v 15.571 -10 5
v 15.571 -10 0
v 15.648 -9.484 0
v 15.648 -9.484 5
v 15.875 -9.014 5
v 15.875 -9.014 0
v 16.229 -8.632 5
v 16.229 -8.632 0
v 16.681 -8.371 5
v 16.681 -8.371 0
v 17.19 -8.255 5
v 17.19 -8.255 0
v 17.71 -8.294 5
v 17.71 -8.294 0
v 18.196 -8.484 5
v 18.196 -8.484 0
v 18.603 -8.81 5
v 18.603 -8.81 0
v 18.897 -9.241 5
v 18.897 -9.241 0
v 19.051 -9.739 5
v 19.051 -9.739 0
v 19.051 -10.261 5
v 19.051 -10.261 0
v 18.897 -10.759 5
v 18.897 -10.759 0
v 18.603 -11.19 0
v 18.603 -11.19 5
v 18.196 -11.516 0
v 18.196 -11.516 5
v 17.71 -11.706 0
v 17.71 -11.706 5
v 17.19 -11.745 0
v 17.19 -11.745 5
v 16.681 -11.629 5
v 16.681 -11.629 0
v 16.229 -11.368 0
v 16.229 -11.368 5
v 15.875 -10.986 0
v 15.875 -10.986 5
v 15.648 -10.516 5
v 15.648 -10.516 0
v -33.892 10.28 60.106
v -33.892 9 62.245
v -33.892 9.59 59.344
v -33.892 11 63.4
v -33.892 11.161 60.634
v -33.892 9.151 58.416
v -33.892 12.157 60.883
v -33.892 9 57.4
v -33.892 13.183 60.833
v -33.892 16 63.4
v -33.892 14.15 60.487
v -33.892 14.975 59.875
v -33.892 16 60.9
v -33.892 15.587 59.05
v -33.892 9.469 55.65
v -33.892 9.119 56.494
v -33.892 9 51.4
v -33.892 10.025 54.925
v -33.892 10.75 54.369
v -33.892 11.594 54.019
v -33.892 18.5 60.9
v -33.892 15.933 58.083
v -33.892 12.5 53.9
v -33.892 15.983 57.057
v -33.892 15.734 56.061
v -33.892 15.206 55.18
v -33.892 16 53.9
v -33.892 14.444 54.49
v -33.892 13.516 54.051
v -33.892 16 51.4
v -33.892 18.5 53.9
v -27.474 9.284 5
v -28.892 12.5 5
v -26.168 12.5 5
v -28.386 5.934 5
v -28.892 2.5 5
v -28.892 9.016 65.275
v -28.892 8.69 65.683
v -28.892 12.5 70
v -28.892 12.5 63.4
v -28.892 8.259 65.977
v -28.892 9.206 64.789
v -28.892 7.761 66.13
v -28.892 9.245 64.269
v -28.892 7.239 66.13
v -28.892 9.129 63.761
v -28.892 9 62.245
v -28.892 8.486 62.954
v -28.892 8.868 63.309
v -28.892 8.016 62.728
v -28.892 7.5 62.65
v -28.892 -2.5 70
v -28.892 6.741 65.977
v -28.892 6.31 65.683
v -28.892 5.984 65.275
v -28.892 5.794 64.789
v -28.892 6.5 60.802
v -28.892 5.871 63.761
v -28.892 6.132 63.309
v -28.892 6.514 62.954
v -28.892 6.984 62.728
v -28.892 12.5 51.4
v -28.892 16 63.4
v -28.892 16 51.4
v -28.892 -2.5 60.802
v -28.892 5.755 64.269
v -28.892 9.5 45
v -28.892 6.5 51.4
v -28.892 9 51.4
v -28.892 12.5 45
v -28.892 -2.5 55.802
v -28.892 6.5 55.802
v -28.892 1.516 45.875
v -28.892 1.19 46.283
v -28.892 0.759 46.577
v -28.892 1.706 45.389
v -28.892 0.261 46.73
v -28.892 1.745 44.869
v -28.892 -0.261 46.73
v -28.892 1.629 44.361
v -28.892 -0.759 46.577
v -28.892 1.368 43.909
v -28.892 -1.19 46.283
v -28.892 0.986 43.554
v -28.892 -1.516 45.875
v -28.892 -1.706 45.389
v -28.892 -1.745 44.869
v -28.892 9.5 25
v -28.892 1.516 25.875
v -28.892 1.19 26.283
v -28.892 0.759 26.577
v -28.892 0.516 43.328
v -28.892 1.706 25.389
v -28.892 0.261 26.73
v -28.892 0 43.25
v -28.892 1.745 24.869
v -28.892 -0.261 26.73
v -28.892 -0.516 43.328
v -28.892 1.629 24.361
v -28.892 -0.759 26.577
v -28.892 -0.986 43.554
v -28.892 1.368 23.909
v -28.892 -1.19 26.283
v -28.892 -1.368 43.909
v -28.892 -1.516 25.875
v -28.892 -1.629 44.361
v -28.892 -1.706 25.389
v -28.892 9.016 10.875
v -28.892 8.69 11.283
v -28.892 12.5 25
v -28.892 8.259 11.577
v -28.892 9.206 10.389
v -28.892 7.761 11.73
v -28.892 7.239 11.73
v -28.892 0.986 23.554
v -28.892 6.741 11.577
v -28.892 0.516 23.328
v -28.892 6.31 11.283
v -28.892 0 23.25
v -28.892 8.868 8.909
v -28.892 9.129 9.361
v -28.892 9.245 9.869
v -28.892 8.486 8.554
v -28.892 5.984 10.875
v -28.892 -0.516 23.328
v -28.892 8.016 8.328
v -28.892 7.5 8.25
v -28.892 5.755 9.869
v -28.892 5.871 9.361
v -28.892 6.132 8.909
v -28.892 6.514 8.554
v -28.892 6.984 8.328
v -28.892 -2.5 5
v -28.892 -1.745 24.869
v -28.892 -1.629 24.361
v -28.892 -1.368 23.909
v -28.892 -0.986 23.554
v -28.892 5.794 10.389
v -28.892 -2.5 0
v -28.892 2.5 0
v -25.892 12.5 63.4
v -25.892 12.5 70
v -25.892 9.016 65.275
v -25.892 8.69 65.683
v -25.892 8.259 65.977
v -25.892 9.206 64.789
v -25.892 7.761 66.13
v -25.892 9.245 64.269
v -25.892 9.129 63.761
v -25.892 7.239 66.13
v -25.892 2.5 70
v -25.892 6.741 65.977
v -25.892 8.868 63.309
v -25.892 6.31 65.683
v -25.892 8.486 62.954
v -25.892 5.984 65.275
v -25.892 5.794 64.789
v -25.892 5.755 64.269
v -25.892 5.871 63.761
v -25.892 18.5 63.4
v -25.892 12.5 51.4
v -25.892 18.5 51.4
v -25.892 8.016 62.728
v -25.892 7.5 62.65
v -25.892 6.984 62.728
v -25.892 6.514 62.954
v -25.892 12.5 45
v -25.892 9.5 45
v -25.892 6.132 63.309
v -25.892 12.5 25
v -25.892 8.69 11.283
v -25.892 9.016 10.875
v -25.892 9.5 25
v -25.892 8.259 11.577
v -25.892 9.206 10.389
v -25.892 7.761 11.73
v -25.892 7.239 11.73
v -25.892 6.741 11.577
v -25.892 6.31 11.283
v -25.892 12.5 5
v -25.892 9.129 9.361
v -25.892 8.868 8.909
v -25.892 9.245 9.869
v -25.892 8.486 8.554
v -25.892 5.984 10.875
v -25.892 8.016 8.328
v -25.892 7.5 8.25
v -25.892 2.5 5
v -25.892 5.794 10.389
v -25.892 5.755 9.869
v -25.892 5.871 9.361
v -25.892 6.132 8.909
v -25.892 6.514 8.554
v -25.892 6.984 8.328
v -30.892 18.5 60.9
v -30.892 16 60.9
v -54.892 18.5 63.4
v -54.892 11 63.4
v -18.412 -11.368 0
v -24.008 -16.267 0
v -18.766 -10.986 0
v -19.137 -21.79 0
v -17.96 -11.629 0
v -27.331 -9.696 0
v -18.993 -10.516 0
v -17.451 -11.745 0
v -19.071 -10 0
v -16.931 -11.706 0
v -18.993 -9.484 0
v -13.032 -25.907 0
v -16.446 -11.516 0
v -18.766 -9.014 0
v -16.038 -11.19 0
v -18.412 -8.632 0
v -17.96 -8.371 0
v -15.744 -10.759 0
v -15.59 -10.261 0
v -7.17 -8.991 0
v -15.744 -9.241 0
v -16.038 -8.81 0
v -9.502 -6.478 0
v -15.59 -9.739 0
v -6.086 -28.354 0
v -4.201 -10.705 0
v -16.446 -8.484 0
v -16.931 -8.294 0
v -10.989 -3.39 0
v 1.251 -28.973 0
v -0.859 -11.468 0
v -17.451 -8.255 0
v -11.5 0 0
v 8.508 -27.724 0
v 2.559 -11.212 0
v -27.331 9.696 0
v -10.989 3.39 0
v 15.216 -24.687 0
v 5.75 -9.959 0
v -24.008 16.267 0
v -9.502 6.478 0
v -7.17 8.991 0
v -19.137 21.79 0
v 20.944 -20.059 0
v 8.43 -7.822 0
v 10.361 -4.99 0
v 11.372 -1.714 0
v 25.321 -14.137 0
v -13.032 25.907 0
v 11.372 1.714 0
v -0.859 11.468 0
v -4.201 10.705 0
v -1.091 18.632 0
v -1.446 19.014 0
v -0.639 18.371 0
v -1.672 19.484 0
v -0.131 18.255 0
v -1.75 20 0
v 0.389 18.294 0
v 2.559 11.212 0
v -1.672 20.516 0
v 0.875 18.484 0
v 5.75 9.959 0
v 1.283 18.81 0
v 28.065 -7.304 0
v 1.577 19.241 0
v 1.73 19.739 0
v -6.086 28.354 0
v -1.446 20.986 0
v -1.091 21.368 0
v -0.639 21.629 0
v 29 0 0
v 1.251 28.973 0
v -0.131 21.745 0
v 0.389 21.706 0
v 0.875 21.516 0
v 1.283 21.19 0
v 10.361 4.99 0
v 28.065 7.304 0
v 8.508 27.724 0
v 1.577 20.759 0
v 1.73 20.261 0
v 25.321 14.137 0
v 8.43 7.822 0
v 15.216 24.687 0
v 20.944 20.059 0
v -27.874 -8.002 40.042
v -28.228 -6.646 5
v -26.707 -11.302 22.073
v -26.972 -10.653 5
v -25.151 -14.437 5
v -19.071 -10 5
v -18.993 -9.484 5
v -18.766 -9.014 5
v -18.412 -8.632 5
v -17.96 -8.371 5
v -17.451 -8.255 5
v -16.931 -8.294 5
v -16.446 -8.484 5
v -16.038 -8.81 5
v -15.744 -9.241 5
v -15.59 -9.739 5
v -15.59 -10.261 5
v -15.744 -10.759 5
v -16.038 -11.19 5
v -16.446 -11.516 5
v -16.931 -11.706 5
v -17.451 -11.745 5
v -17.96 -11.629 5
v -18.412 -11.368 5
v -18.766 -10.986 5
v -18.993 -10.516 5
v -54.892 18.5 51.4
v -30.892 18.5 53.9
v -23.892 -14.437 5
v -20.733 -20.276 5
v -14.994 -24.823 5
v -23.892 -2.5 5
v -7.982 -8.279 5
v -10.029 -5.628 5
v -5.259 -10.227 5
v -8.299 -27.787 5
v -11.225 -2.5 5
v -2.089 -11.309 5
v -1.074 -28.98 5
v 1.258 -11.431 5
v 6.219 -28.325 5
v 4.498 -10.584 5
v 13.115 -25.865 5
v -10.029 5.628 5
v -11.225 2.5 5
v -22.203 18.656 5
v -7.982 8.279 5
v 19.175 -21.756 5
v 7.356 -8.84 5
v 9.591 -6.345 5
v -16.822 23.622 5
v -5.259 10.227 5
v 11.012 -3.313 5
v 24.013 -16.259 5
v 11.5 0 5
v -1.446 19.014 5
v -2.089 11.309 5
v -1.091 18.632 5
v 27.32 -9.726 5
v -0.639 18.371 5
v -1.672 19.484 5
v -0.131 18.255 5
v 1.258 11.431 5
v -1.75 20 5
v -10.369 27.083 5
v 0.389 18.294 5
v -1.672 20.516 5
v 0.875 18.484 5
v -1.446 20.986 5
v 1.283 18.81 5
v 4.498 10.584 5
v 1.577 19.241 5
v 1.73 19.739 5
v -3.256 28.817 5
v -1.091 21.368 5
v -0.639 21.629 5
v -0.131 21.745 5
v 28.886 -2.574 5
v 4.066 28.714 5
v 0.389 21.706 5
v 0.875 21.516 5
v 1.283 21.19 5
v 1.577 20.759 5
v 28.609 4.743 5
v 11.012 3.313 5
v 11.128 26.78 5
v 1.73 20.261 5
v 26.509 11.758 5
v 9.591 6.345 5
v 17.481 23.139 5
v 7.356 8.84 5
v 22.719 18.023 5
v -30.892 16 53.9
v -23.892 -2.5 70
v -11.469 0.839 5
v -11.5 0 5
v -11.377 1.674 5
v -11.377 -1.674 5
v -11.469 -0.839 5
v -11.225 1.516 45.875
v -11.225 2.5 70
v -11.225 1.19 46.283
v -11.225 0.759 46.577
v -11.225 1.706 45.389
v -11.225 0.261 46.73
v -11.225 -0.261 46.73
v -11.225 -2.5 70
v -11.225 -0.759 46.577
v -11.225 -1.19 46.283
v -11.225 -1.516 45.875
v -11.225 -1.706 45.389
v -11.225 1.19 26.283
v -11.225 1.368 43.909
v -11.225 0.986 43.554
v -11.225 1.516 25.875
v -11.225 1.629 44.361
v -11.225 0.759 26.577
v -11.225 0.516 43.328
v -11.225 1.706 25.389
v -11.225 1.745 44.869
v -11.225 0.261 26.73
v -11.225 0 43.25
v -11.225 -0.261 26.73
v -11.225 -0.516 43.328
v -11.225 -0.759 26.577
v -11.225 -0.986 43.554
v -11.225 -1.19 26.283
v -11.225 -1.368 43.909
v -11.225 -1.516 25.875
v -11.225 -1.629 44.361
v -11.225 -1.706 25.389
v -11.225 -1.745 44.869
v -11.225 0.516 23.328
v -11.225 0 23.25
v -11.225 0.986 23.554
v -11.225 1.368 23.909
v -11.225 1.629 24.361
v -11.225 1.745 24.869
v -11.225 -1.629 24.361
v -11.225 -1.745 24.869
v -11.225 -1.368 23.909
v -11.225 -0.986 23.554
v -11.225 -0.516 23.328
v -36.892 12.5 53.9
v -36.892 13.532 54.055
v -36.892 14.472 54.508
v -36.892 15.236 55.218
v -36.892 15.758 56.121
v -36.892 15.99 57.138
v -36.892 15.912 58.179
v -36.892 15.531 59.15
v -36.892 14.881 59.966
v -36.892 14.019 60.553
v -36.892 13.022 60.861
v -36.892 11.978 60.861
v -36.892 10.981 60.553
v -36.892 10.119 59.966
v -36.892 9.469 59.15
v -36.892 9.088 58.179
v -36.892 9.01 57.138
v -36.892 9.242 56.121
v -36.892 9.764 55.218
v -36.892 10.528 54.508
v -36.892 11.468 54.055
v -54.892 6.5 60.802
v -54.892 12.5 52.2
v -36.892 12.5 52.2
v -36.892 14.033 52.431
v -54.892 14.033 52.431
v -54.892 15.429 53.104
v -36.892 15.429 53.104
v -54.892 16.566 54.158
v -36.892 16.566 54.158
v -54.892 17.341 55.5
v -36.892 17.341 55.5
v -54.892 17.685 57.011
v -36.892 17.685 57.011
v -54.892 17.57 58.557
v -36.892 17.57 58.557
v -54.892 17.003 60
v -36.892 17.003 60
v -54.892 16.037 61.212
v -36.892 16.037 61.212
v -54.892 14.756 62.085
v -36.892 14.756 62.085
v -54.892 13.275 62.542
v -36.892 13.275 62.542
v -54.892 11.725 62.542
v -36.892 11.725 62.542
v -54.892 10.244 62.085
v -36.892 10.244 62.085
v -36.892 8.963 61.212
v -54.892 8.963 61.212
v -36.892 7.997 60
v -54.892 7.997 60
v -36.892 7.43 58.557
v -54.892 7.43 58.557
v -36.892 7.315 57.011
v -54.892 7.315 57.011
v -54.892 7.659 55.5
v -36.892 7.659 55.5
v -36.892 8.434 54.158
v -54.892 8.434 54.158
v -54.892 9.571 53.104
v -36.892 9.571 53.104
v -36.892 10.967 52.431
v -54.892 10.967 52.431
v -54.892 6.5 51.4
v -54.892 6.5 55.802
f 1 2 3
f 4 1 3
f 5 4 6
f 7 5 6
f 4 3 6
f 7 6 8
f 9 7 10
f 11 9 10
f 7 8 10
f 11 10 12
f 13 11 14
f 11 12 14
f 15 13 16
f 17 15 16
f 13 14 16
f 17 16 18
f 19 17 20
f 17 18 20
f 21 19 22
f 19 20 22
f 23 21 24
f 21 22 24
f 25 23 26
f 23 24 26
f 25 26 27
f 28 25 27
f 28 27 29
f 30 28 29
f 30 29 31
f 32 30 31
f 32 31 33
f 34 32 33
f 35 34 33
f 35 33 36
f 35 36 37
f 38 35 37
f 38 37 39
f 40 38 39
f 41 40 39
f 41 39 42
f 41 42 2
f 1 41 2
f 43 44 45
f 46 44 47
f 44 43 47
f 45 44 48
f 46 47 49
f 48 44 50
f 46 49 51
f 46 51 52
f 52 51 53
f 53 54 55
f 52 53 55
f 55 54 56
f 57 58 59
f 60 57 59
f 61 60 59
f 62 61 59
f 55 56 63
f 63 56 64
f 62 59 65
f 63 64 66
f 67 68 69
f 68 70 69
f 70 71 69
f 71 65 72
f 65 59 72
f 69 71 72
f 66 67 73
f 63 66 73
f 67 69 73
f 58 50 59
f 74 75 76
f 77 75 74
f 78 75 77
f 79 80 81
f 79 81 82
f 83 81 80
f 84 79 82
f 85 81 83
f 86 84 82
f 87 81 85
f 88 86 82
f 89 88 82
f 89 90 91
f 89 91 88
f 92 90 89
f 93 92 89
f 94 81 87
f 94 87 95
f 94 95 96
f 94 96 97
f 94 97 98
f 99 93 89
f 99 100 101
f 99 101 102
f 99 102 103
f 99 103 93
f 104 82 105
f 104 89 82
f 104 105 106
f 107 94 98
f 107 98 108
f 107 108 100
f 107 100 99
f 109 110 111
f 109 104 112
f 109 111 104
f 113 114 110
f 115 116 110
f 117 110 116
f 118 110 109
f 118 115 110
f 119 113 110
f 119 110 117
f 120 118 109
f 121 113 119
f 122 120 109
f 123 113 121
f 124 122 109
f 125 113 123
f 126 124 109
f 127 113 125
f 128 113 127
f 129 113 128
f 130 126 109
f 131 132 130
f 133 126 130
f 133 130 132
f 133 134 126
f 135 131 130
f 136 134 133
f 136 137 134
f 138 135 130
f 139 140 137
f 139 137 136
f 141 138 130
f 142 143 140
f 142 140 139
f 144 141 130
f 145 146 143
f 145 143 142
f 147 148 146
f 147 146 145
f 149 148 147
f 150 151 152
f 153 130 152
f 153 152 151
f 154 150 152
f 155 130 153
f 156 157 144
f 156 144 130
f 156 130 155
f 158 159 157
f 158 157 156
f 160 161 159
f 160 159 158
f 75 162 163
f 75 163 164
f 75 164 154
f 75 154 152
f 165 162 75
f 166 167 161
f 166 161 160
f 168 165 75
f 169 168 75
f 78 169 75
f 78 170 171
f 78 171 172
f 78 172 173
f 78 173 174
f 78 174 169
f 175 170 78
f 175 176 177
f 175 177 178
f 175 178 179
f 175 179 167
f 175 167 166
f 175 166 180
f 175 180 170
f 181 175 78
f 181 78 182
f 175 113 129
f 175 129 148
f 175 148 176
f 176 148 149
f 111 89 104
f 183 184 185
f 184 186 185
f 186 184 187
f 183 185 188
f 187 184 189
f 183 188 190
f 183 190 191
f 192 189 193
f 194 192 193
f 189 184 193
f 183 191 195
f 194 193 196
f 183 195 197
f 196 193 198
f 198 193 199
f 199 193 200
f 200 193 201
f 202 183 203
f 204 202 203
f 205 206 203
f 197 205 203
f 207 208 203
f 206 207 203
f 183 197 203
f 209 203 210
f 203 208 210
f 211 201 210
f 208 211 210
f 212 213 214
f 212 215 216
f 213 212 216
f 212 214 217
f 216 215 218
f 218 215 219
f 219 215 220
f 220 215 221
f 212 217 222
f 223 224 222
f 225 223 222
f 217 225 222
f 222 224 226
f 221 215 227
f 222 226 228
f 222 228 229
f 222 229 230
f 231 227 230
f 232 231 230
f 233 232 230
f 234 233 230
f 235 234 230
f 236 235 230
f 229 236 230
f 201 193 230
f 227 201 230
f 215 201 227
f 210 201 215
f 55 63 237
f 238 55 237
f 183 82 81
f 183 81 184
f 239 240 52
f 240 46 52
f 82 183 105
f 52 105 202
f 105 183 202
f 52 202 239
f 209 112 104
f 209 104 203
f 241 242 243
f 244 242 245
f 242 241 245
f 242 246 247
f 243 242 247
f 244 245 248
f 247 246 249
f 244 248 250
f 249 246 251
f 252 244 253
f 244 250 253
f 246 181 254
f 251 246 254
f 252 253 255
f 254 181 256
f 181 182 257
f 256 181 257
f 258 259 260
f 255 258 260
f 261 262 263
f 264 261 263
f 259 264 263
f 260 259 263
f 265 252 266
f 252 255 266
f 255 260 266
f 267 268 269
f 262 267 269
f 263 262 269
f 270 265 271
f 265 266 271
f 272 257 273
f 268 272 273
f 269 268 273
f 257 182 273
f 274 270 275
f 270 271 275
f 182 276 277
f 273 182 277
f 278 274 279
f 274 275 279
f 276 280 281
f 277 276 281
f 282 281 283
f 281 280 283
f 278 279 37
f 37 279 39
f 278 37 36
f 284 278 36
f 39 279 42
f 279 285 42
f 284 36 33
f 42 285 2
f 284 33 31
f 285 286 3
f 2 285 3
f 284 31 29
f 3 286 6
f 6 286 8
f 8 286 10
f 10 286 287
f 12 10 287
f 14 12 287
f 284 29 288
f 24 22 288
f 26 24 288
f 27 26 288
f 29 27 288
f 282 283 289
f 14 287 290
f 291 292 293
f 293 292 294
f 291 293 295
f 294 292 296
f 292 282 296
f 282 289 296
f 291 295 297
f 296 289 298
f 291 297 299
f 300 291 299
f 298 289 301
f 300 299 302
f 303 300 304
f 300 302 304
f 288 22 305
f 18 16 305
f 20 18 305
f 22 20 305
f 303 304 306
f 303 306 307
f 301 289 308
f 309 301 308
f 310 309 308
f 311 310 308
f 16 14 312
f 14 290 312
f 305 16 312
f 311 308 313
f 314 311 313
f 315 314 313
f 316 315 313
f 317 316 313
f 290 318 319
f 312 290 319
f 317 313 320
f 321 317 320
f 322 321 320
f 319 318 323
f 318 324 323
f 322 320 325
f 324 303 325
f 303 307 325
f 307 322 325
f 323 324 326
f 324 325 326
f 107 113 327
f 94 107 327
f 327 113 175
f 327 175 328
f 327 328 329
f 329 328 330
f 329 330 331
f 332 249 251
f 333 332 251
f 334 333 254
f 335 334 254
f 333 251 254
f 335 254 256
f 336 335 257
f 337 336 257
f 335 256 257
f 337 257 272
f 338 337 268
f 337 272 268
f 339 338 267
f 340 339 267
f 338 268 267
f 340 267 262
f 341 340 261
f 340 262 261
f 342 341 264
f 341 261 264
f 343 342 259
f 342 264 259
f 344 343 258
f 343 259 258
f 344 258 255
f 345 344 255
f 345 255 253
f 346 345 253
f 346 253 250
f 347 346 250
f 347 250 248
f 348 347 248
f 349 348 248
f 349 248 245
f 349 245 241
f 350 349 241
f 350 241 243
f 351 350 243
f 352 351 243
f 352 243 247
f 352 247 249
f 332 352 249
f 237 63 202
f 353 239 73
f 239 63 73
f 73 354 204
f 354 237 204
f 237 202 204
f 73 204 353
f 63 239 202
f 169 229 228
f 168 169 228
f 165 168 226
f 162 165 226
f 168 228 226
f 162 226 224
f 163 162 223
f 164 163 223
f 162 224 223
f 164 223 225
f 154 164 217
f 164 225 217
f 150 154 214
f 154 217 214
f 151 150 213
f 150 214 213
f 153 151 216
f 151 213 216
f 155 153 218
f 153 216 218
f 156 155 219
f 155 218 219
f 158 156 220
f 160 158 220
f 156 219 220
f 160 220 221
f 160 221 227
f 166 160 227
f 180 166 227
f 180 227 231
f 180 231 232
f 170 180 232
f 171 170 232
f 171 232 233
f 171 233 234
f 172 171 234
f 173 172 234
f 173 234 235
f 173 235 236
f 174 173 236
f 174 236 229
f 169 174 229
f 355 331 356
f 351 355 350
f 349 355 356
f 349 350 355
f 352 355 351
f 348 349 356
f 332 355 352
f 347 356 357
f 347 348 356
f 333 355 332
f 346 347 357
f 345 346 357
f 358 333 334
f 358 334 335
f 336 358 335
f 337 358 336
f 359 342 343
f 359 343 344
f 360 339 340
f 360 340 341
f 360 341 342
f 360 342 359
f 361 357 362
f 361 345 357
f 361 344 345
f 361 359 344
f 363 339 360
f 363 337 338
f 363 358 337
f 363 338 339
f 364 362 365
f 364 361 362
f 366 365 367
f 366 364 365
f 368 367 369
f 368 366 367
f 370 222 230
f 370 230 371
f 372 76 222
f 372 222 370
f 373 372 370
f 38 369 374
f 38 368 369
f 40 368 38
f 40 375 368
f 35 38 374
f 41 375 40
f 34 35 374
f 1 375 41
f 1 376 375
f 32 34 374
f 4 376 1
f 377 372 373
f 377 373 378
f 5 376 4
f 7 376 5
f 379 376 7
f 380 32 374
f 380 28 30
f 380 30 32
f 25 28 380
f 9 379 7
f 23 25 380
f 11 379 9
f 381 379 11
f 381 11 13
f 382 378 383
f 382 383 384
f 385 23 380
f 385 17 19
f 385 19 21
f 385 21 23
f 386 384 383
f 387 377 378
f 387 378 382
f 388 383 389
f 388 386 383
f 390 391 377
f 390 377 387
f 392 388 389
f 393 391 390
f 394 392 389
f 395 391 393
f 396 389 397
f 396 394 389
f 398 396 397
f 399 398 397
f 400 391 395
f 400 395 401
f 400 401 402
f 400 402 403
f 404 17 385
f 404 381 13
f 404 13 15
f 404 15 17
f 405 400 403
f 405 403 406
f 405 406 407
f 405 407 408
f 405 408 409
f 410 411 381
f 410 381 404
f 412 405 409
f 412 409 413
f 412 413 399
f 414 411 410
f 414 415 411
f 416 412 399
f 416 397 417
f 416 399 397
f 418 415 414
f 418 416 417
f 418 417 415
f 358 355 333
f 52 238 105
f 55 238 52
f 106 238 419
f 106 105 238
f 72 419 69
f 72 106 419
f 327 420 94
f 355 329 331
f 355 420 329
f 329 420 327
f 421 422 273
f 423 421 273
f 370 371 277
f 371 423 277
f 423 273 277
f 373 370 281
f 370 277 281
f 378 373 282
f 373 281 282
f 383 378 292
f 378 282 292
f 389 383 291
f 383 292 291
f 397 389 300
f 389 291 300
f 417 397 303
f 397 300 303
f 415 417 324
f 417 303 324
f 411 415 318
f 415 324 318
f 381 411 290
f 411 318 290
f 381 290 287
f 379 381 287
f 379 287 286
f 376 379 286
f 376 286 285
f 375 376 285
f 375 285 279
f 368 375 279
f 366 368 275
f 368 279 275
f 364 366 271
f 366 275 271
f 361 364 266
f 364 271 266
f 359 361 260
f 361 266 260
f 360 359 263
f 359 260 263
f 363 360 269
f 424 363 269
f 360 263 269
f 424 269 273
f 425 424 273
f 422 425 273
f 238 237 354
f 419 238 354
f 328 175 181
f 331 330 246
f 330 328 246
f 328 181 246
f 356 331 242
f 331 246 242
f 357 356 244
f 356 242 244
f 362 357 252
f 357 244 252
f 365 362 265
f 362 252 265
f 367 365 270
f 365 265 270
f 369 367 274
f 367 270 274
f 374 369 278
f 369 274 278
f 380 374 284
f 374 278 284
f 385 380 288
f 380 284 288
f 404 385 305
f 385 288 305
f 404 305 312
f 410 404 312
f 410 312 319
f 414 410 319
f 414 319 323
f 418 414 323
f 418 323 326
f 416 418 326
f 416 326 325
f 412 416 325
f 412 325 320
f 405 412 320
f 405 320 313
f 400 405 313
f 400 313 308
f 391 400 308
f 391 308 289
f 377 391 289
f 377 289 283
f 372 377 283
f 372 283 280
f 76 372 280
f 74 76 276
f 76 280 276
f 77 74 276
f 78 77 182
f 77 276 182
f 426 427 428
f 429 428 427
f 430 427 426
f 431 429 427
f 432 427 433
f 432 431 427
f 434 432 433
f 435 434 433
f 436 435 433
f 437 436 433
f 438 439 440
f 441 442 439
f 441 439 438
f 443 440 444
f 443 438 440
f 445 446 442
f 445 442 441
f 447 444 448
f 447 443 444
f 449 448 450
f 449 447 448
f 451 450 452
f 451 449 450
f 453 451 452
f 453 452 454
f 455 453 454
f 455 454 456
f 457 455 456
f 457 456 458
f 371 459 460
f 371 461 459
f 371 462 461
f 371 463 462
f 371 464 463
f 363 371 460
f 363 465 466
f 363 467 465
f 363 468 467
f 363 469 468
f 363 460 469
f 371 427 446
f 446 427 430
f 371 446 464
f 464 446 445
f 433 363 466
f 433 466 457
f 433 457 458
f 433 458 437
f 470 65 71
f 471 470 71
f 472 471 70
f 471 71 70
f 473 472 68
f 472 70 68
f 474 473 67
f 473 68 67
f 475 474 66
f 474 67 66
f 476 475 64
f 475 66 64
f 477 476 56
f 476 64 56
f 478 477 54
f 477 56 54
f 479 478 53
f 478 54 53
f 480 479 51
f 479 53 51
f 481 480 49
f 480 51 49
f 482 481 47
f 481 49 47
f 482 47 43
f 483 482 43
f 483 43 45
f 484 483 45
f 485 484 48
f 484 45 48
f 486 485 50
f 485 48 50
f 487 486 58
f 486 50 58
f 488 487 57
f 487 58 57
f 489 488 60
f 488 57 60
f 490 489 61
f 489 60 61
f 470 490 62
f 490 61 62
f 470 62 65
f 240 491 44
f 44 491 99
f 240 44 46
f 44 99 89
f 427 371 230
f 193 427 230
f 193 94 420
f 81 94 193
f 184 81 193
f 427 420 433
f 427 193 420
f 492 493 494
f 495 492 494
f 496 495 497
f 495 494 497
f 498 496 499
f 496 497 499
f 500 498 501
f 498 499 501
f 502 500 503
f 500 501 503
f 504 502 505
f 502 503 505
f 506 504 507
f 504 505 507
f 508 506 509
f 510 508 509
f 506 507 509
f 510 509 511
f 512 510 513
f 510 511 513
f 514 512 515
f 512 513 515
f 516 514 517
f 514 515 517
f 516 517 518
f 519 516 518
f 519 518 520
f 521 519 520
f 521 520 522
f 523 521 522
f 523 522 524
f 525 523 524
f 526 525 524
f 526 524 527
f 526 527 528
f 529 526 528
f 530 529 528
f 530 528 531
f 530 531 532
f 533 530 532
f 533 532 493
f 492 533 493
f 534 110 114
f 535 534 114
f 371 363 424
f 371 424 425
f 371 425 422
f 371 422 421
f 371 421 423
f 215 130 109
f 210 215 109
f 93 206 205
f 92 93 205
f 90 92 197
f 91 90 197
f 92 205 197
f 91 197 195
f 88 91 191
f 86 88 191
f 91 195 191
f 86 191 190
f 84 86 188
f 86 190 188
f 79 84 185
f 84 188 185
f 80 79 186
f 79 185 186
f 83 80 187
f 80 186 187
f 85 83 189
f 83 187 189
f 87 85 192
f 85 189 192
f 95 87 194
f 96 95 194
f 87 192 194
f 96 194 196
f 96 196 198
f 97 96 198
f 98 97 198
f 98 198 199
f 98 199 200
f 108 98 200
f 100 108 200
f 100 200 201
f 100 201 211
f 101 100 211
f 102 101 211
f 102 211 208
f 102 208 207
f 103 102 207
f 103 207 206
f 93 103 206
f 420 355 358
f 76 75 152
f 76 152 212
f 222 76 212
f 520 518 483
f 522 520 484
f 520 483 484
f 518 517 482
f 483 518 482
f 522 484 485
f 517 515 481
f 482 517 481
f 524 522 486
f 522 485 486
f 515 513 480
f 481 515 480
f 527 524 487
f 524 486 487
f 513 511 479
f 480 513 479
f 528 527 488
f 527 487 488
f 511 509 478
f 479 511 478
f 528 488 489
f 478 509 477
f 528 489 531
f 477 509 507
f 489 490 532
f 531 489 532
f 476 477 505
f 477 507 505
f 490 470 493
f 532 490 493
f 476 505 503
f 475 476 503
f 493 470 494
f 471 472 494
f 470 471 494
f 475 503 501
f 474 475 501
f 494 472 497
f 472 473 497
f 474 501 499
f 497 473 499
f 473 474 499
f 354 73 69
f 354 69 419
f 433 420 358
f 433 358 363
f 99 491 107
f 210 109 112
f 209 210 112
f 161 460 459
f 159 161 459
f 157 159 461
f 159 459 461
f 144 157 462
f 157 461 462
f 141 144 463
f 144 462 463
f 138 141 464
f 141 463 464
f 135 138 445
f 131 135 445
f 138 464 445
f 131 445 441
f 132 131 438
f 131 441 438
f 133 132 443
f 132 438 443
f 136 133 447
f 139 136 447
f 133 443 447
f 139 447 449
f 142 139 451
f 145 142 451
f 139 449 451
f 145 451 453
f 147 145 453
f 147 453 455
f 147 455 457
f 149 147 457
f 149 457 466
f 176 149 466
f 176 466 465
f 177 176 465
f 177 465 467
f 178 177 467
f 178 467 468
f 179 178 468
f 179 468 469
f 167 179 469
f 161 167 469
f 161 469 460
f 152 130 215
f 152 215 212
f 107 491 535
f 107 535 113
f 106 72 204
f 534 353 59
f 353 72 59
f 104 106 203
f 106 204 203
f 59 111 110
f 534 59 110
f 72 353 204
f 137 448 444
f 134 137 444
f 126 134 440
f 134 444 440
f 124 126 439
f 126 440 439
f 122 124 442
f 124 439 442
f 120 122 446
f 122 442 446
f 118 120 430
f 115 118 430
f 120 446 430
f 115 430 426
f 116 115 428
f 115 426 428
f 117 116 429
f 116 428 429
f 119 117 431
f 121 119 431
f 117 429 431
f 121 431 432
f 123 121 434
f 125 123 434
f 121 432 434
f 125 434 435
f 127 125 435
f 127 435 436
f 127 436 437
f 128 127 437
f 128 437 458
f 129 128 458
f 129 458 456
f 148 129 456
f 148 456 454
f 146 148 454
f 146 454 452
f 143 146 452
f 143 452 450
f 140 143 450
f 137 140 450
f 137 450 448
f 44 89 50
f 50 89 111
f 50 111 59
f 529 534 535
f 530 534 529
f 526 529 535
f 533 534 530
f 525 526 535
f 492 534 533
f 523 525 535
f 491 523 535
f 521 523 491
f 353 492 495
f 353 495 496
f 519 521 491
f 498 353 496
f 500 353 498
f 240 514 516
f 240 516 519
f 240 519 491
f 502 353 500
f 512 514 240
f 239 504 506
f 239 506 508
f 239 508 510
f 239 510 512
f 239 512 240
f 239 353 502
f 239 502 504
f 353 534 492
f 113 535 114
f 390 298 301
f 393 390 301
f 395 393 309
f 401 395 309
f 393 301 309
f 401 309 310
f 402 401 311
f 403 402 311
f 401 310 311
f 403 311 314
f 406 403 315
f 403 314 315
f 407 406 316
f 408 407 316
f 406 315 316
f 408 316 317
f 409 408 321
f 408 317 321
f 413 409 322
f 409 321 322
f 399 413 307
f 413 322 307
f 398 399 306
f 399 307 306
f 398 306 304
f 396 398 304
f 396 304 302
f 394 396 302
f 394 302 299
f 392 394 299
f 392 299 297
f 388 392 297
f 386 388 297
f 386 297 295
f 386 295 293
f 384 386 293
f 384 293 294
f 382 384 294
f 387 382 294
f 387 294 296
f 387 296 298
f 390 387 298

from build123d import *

# Parameters (mm, degrees)
SKETCH_1_R               = 29
EXTRUDE_1_DEPTH          = 5
HOLE_WIZARD_1_D          = 3.5
HOLE_WIZARD_2_D          = 23
EXTRUDE_3_DEPTH          = 65
SKETCH_9_W               = 1
SKETCH_9_H               = 5
CUT_EXTRUDE_1_DEPTH      = 10
SKETCH_10_W              = 3
SKETCH_10_H              = 65
EXTRUDE_5_DEPTH          = 10
HOLE_WIZARD_3_D          = 3.5
CUT_EXTRUDE_2_REACH      = 97.355
SKETCH_16_W              = 20
SKETCH_16_H              = 3
EXTRUDE_START            = -65
EXTRUDE_6_DEPTH          = 65
HOLE_WIZARD_4_D          = 3.5
SKETCH_22_W              = 12
SKETCH_22_H              = 6
EXTRUDE_7_DEPTH          = 3
EXTRUDE_8_DEPTH          = 8
HOLE_WIZARD_5_D          = 7
HOLE_WIZARD_5_DEPTH      = 3
SKETCH_27_W              = 5
SKETCH_27_H              = 3.5
CUT_EXTRUDE_3_DEPTH      = 70.598725899
CUT_EXTRUDE_4_REACH      = 94.289
SKETCH_28_W              = 3
SKETCH_28_H              = 3.5
SKETCH_29_R              = 3.5
EXTRUDE_9_DEPTH          = 18
HOLE_WIZARD_6_D          = 10.4
HOLE_WIZARD_6_DEPTH      = 18
SKETCH_32_W              = 26
SKETCH_32_H              = 5
EXTRUDE_10_DEPTH         = 9
CUT_EXTRUDE_5_REACH      = 88.897
EXTRUDE_11_DEPTH         = 65
CUT_EXTRUDE_6_REACH      = 94.404
CUT_EXTRUDE_6_END_RADIUS = 29


with BuildPart() as part:
    # 草图1 → 凸台-拉伸1 (new body)
    with BuildSketch(Plane.XY):
        Circle(SKETCH_1_R)
    extrude(amount=EXTRUDE_1_DEPTH)

    # 孔1 (through all)
    with Locations(Plane.XY.offset(5)):
        with Locations((0, 20), (-17.320508076, -10), (17.320508076, -10)):
            Hole(HOLE_WIZARD_1_D / 2)

    # 孔2 (through all)
    with Locations(Plane.XY.offset(5)):
        with Locations((0, 0)):
            Hole(HOLE_WIZARD_2_D / 2)

    # 草图7 → 凸台-拉伸3 (add)
    with BuildSketch(Plane.XY.offset(5)):
        with BuildLine():
            Line((-28.892040426, 2.5), (-28.892040426, -2.5))
            Line((-28.892040426, -2.5), (-11.22497216, -2.5))
            ThreePointArc((-11.22497216, -2.5), (-11.5, 0), (-11.22497216, 2.5))
            Line((-11.22497216, 2.5), (-28.892040426, 2.5))
        make_face()
    extrude(amount=EXTRUDE_3_DEPTH)

    # 草图9 → 切除-拉伸1 (cut)
    with BuildSketch(Plane.XY.offset(5)):
        with Locations((-29.392040426, 0)):
            Rectangle(SKETCH_9_W, SKETCH_9_H)
    extrude(amount=-CUT_EXTRUDE_1_DEPTH, mode=Mode.SUBTRACT)

    # 草图10 → 凸台-拉伸5 (add)
    with BuildSketch(Plane(origin=(0, 2.5, 0), x_dir=(1, 0, 0), z_dir=(0, 1, 0))):
        with Locations((-27.392040426, -37.5)):
            Rectangle(SKETCH_10_W, SKETCH_10_H)
    extrude(amount=EXTRUDE_5_DEPTH)

    # 孔3 (through all)
    with Locations(Plane.ZY.offset(28.892040426)):
        with Locations((10, 7.5), (64.4, 7.5)):
            Hole(HOLE_WIZARD_3_D / 2)

    # 草图16 → 切除-拉伸2 (cut, up to next)
    with BuildSketch(Plane.ZY.offset(28.892040426), mode=Mode.PRIVATE) as cut_extrude_2_sk1:
        with Locations((35, 11)):
            Rectangle(SKETCH_16_W, SKETCH_16_H)
    cut_extrude_2_tool1 = extrude(cut_extrude_2_sk1.sketch, amount=-CUT_EXTRUDE_2_REACH, mode=Mode.PRIVATE) & part.part
    add(cut_extrude_2_tool1.solids().sort_by_distance((-28.89204, 11, 35))[0], mode=Mode.SUBTRACT)

    # 草图20 → 凸台-拉伸6 (add)
    with BuildSketch(Plane.XY.offset(70).offset(EXTRUDE_START)):
        with BuildLine():
            Line((-11.22497216, 2.5), (-11.22497216, -2.5))
            ThreePointArc((-11.22497216, -2.5), (-11.5, 0), (-11.22497216, 2.5))
        make_face()
    extrude(amount=EXTRUDE_6_DEPTH)

    # 孔4 (through all)
    with Locations(Plane.ZY.offset(28.892040426)):
        with Locations((25, 0), (45, 0)):
            Hole(HOLE_WIZARD_4_D / 2)

    # 草图22 → 凸台-拉伸7 (add)
    with BuildSketch(Plane.ZY.offset(28.892040426)):
        with Locations((57.4, 15.5)):
            Rectangle(SKETCH_22_W, SKETCH_22_H)
    extrude(amount=-EXTRUDE_7_DEPTH)

    # 草图23 → 凸台-拉伸8 (add)
    with BuildSketch(Plane.ZY.offset(28.892040426)):
        Polygon((51.4, 6.5), (60.801923789, 6.5), (63.4, 11), (63.4, 12.5), (63.4, 18.5), (51.4, 18.5), (51.4, 12.5), align=None)
    extrude(amount=EXTRUDE_8_DEPTH)

    # 孔5
    with Locations(Plane.ZY.offset(36.892040426)):
        with Locations((57.4, 12.5)):
            Hole(HOLE_WIZARD_5_D / 2, depth=HOLE_WIZARD_5_DEPTH)

    # 草图27 → 切除-拉伸3 (cut, through all)
    with BuildSketch(Plane(origin=(0, 0, 51.4), x_dir=(-1, 0, 0), z_dir=(0, 0, -1))):
        with Locations((31.392040426, 14.25)):
            Rectangle(SKETCH_27_W, SKETCH_27_H)
        with Locations((31.392040426, 10.75)):
            Rectangle(SKETCH_27_W, SKETCH_27_H)
    extrude(amount=-CUT_EXTRUDE_3_DEPTH, mode=Mode.SUBTRACT)

    # 草图28 → 切除-拉伸4 (cut, up to next)
    with BuildSketch(Plane(origin=(0, 18.5, 0), x_dir=(1, 0, 0), z_dir=(0, 1, 0)), mode=Mode.PRIVATE) as cut_extrude_4_sk1:
        with Locations((-32.392040426, -59.15)):
            Rectangle(SKETCH_28_W, SKETCH_28_H)
    cut_extrude_4_tool1 = extrude(cut_extrude_4_sk1.sketch, amount=-CUT_EXTRUDE_4_REACH, mode=Mode.PRIVATE) & part.part
    # 草图28 → 切除-拉伸4 (cut, up to next)
    with BuildSketch(Plane(origin=(0, 18.5, 0), x_dir=(1, 0, 0), z_dir=(0, 1, 0)), mode=Mode.PRIVATE) as cut_extrude_4_sk2:
        with Locations((-32.392040426, -55.65)):
            Rectangle(SKETCH_28_W, SKETCH_28_H)
    cut_extrude_4_tool2 = extrude(cut_extrude_4_sk2.sketch, amount=-CUT_EXTRUDE_4_REACH, mode=Mode.PRIVATE) & part.part
    add(cut_extrude_4_tool1.solids().sort_by_distance((-32.39204, 18.5, 59.15))[0], mode=Mode.SUBTRACT)
    add(cut_extrude_4_tool2.solids().sort_by_distance((-32.39204, 18.5, 55.65))[0], mode=Mode.SUBTRACT)

    # 草图29 → 凸台-拉伸9 (add)
    # profile 1 of 2: a face of its own
    with BuildSketch(Plane.ZY.offset(36.892040426)):
        Polygon((60.801923789, 6.5), (63.4, 11), (63.4, 18.5), (51.4, 18.5), (51.4, 6.5), align=None)
        with Locations((57.4, 12.5)):
            Circle(SKETCH_29_R, mode=Mode.SUBTRACT)
    # profile 2 of 2: a face of its own
    with BuildSketch(Plane.ZY.offset(36.892040426)):
        with Locations((57.4, 12.5)):
            Circle(SKETCH_29_R)
    extrude(amount=EXTRUDE_9_DEPTH)

    # 孔6
    with Locations(Plane.ZY.offset(54.892040426)):
        with Locations((57.4, 12.5)):
            Hole(HOLE_WIZARD_6_D / 2, depth=HOLE_WIZARD_6_DEPTH)

    # 草图32 → 凸台-拉伸10 (add)
    with BuildSketch(Plane.XZ.offset(-6.5)):
        with Locations((-41.892040426, 58.301923789)):
            Rectangle(SKETCH_32_W, SKETCH_32_H)
    extrude(amount=EXTRUDE_10_DEPTH)

    # 草图33 → 切除-拉伸5 (cut, up to next)
    with BuildSketch(Plane.XY.offset(60.801923789), mode=Mode.PRIVATE) as cut_extrude_5_sk1:
        Polygon((-54.892040426, 6.5), (-28.892040426, -2.5), (-54.892040426, -2.5), align=None)
    cut_extrude_5_tool1 = extrude(cut_extrude_5_sk1.sketch, amount=-CUT_EXTRUDE_5_REACH, mode=Mode.PRIVATE) & part.part
    add(cut_extrude_5_tool1.solids().sort_by_distance((-46.225374, 0.5, 60.801924))[0], mode=Mode.SUBTRACT)

    # 草图34 → 凸台-拉伸11 (add)
    with BuildSketch(Plane.XY.offset(5)):
        with BuildLine():
            Line((-23.892040426, -16.436861144), (-23.892040426, -2.5))
            Line((-23.892040426, -2.5), (-28.892040426, -2.5))
            ThreePointArc((-28.892040426, -2.5), (-27.296498356, -9.792914658), (-23.892040426, -16.436861144))
        make_face()
    extrude(amount=EXTRUDE_11_DEPTH)

    # 切除-拉伸6: up to this cylinder (the profile starts inside it)
    cut_extrude_6_end = Plane(origin=(0, 0, 45.61427), z_dir=(0, 0, -1)) * Cylinder(CUT_EXTRUDE_6_END_RADIUS, 247.808, mode=Mode.PRIVATE)
    # 草图35 → 切除-拉伸6 (cut, up to the surface)
    with BuildSketch(Plane(origin=(-23.892040426, 0, 0), x_dir=(0, 0, -1), z_dir=(1, 0, 0)), mode=Mode.PRIVATE) as cut_extrude_6_sk1:
        Polygon((-70, -2.5), (-5, -14.436861144), (-5, -16.436861144), (-70, -16.436861144), align=None)
    cut_extrude_6_tool1 = extrude(cut_extrude_6_sk1.sketch, amount=-CUT_EXTRUDE_6_REACH, mode=Mode.PRIVATE) & cut_extrude_6_end
    add(cut_extrude_6_tool1.solids().sort_by_distance((-23.89204, -11.707577, 45.61427))[0], mode=Mode.SUBTRACT)


solid = part.part
